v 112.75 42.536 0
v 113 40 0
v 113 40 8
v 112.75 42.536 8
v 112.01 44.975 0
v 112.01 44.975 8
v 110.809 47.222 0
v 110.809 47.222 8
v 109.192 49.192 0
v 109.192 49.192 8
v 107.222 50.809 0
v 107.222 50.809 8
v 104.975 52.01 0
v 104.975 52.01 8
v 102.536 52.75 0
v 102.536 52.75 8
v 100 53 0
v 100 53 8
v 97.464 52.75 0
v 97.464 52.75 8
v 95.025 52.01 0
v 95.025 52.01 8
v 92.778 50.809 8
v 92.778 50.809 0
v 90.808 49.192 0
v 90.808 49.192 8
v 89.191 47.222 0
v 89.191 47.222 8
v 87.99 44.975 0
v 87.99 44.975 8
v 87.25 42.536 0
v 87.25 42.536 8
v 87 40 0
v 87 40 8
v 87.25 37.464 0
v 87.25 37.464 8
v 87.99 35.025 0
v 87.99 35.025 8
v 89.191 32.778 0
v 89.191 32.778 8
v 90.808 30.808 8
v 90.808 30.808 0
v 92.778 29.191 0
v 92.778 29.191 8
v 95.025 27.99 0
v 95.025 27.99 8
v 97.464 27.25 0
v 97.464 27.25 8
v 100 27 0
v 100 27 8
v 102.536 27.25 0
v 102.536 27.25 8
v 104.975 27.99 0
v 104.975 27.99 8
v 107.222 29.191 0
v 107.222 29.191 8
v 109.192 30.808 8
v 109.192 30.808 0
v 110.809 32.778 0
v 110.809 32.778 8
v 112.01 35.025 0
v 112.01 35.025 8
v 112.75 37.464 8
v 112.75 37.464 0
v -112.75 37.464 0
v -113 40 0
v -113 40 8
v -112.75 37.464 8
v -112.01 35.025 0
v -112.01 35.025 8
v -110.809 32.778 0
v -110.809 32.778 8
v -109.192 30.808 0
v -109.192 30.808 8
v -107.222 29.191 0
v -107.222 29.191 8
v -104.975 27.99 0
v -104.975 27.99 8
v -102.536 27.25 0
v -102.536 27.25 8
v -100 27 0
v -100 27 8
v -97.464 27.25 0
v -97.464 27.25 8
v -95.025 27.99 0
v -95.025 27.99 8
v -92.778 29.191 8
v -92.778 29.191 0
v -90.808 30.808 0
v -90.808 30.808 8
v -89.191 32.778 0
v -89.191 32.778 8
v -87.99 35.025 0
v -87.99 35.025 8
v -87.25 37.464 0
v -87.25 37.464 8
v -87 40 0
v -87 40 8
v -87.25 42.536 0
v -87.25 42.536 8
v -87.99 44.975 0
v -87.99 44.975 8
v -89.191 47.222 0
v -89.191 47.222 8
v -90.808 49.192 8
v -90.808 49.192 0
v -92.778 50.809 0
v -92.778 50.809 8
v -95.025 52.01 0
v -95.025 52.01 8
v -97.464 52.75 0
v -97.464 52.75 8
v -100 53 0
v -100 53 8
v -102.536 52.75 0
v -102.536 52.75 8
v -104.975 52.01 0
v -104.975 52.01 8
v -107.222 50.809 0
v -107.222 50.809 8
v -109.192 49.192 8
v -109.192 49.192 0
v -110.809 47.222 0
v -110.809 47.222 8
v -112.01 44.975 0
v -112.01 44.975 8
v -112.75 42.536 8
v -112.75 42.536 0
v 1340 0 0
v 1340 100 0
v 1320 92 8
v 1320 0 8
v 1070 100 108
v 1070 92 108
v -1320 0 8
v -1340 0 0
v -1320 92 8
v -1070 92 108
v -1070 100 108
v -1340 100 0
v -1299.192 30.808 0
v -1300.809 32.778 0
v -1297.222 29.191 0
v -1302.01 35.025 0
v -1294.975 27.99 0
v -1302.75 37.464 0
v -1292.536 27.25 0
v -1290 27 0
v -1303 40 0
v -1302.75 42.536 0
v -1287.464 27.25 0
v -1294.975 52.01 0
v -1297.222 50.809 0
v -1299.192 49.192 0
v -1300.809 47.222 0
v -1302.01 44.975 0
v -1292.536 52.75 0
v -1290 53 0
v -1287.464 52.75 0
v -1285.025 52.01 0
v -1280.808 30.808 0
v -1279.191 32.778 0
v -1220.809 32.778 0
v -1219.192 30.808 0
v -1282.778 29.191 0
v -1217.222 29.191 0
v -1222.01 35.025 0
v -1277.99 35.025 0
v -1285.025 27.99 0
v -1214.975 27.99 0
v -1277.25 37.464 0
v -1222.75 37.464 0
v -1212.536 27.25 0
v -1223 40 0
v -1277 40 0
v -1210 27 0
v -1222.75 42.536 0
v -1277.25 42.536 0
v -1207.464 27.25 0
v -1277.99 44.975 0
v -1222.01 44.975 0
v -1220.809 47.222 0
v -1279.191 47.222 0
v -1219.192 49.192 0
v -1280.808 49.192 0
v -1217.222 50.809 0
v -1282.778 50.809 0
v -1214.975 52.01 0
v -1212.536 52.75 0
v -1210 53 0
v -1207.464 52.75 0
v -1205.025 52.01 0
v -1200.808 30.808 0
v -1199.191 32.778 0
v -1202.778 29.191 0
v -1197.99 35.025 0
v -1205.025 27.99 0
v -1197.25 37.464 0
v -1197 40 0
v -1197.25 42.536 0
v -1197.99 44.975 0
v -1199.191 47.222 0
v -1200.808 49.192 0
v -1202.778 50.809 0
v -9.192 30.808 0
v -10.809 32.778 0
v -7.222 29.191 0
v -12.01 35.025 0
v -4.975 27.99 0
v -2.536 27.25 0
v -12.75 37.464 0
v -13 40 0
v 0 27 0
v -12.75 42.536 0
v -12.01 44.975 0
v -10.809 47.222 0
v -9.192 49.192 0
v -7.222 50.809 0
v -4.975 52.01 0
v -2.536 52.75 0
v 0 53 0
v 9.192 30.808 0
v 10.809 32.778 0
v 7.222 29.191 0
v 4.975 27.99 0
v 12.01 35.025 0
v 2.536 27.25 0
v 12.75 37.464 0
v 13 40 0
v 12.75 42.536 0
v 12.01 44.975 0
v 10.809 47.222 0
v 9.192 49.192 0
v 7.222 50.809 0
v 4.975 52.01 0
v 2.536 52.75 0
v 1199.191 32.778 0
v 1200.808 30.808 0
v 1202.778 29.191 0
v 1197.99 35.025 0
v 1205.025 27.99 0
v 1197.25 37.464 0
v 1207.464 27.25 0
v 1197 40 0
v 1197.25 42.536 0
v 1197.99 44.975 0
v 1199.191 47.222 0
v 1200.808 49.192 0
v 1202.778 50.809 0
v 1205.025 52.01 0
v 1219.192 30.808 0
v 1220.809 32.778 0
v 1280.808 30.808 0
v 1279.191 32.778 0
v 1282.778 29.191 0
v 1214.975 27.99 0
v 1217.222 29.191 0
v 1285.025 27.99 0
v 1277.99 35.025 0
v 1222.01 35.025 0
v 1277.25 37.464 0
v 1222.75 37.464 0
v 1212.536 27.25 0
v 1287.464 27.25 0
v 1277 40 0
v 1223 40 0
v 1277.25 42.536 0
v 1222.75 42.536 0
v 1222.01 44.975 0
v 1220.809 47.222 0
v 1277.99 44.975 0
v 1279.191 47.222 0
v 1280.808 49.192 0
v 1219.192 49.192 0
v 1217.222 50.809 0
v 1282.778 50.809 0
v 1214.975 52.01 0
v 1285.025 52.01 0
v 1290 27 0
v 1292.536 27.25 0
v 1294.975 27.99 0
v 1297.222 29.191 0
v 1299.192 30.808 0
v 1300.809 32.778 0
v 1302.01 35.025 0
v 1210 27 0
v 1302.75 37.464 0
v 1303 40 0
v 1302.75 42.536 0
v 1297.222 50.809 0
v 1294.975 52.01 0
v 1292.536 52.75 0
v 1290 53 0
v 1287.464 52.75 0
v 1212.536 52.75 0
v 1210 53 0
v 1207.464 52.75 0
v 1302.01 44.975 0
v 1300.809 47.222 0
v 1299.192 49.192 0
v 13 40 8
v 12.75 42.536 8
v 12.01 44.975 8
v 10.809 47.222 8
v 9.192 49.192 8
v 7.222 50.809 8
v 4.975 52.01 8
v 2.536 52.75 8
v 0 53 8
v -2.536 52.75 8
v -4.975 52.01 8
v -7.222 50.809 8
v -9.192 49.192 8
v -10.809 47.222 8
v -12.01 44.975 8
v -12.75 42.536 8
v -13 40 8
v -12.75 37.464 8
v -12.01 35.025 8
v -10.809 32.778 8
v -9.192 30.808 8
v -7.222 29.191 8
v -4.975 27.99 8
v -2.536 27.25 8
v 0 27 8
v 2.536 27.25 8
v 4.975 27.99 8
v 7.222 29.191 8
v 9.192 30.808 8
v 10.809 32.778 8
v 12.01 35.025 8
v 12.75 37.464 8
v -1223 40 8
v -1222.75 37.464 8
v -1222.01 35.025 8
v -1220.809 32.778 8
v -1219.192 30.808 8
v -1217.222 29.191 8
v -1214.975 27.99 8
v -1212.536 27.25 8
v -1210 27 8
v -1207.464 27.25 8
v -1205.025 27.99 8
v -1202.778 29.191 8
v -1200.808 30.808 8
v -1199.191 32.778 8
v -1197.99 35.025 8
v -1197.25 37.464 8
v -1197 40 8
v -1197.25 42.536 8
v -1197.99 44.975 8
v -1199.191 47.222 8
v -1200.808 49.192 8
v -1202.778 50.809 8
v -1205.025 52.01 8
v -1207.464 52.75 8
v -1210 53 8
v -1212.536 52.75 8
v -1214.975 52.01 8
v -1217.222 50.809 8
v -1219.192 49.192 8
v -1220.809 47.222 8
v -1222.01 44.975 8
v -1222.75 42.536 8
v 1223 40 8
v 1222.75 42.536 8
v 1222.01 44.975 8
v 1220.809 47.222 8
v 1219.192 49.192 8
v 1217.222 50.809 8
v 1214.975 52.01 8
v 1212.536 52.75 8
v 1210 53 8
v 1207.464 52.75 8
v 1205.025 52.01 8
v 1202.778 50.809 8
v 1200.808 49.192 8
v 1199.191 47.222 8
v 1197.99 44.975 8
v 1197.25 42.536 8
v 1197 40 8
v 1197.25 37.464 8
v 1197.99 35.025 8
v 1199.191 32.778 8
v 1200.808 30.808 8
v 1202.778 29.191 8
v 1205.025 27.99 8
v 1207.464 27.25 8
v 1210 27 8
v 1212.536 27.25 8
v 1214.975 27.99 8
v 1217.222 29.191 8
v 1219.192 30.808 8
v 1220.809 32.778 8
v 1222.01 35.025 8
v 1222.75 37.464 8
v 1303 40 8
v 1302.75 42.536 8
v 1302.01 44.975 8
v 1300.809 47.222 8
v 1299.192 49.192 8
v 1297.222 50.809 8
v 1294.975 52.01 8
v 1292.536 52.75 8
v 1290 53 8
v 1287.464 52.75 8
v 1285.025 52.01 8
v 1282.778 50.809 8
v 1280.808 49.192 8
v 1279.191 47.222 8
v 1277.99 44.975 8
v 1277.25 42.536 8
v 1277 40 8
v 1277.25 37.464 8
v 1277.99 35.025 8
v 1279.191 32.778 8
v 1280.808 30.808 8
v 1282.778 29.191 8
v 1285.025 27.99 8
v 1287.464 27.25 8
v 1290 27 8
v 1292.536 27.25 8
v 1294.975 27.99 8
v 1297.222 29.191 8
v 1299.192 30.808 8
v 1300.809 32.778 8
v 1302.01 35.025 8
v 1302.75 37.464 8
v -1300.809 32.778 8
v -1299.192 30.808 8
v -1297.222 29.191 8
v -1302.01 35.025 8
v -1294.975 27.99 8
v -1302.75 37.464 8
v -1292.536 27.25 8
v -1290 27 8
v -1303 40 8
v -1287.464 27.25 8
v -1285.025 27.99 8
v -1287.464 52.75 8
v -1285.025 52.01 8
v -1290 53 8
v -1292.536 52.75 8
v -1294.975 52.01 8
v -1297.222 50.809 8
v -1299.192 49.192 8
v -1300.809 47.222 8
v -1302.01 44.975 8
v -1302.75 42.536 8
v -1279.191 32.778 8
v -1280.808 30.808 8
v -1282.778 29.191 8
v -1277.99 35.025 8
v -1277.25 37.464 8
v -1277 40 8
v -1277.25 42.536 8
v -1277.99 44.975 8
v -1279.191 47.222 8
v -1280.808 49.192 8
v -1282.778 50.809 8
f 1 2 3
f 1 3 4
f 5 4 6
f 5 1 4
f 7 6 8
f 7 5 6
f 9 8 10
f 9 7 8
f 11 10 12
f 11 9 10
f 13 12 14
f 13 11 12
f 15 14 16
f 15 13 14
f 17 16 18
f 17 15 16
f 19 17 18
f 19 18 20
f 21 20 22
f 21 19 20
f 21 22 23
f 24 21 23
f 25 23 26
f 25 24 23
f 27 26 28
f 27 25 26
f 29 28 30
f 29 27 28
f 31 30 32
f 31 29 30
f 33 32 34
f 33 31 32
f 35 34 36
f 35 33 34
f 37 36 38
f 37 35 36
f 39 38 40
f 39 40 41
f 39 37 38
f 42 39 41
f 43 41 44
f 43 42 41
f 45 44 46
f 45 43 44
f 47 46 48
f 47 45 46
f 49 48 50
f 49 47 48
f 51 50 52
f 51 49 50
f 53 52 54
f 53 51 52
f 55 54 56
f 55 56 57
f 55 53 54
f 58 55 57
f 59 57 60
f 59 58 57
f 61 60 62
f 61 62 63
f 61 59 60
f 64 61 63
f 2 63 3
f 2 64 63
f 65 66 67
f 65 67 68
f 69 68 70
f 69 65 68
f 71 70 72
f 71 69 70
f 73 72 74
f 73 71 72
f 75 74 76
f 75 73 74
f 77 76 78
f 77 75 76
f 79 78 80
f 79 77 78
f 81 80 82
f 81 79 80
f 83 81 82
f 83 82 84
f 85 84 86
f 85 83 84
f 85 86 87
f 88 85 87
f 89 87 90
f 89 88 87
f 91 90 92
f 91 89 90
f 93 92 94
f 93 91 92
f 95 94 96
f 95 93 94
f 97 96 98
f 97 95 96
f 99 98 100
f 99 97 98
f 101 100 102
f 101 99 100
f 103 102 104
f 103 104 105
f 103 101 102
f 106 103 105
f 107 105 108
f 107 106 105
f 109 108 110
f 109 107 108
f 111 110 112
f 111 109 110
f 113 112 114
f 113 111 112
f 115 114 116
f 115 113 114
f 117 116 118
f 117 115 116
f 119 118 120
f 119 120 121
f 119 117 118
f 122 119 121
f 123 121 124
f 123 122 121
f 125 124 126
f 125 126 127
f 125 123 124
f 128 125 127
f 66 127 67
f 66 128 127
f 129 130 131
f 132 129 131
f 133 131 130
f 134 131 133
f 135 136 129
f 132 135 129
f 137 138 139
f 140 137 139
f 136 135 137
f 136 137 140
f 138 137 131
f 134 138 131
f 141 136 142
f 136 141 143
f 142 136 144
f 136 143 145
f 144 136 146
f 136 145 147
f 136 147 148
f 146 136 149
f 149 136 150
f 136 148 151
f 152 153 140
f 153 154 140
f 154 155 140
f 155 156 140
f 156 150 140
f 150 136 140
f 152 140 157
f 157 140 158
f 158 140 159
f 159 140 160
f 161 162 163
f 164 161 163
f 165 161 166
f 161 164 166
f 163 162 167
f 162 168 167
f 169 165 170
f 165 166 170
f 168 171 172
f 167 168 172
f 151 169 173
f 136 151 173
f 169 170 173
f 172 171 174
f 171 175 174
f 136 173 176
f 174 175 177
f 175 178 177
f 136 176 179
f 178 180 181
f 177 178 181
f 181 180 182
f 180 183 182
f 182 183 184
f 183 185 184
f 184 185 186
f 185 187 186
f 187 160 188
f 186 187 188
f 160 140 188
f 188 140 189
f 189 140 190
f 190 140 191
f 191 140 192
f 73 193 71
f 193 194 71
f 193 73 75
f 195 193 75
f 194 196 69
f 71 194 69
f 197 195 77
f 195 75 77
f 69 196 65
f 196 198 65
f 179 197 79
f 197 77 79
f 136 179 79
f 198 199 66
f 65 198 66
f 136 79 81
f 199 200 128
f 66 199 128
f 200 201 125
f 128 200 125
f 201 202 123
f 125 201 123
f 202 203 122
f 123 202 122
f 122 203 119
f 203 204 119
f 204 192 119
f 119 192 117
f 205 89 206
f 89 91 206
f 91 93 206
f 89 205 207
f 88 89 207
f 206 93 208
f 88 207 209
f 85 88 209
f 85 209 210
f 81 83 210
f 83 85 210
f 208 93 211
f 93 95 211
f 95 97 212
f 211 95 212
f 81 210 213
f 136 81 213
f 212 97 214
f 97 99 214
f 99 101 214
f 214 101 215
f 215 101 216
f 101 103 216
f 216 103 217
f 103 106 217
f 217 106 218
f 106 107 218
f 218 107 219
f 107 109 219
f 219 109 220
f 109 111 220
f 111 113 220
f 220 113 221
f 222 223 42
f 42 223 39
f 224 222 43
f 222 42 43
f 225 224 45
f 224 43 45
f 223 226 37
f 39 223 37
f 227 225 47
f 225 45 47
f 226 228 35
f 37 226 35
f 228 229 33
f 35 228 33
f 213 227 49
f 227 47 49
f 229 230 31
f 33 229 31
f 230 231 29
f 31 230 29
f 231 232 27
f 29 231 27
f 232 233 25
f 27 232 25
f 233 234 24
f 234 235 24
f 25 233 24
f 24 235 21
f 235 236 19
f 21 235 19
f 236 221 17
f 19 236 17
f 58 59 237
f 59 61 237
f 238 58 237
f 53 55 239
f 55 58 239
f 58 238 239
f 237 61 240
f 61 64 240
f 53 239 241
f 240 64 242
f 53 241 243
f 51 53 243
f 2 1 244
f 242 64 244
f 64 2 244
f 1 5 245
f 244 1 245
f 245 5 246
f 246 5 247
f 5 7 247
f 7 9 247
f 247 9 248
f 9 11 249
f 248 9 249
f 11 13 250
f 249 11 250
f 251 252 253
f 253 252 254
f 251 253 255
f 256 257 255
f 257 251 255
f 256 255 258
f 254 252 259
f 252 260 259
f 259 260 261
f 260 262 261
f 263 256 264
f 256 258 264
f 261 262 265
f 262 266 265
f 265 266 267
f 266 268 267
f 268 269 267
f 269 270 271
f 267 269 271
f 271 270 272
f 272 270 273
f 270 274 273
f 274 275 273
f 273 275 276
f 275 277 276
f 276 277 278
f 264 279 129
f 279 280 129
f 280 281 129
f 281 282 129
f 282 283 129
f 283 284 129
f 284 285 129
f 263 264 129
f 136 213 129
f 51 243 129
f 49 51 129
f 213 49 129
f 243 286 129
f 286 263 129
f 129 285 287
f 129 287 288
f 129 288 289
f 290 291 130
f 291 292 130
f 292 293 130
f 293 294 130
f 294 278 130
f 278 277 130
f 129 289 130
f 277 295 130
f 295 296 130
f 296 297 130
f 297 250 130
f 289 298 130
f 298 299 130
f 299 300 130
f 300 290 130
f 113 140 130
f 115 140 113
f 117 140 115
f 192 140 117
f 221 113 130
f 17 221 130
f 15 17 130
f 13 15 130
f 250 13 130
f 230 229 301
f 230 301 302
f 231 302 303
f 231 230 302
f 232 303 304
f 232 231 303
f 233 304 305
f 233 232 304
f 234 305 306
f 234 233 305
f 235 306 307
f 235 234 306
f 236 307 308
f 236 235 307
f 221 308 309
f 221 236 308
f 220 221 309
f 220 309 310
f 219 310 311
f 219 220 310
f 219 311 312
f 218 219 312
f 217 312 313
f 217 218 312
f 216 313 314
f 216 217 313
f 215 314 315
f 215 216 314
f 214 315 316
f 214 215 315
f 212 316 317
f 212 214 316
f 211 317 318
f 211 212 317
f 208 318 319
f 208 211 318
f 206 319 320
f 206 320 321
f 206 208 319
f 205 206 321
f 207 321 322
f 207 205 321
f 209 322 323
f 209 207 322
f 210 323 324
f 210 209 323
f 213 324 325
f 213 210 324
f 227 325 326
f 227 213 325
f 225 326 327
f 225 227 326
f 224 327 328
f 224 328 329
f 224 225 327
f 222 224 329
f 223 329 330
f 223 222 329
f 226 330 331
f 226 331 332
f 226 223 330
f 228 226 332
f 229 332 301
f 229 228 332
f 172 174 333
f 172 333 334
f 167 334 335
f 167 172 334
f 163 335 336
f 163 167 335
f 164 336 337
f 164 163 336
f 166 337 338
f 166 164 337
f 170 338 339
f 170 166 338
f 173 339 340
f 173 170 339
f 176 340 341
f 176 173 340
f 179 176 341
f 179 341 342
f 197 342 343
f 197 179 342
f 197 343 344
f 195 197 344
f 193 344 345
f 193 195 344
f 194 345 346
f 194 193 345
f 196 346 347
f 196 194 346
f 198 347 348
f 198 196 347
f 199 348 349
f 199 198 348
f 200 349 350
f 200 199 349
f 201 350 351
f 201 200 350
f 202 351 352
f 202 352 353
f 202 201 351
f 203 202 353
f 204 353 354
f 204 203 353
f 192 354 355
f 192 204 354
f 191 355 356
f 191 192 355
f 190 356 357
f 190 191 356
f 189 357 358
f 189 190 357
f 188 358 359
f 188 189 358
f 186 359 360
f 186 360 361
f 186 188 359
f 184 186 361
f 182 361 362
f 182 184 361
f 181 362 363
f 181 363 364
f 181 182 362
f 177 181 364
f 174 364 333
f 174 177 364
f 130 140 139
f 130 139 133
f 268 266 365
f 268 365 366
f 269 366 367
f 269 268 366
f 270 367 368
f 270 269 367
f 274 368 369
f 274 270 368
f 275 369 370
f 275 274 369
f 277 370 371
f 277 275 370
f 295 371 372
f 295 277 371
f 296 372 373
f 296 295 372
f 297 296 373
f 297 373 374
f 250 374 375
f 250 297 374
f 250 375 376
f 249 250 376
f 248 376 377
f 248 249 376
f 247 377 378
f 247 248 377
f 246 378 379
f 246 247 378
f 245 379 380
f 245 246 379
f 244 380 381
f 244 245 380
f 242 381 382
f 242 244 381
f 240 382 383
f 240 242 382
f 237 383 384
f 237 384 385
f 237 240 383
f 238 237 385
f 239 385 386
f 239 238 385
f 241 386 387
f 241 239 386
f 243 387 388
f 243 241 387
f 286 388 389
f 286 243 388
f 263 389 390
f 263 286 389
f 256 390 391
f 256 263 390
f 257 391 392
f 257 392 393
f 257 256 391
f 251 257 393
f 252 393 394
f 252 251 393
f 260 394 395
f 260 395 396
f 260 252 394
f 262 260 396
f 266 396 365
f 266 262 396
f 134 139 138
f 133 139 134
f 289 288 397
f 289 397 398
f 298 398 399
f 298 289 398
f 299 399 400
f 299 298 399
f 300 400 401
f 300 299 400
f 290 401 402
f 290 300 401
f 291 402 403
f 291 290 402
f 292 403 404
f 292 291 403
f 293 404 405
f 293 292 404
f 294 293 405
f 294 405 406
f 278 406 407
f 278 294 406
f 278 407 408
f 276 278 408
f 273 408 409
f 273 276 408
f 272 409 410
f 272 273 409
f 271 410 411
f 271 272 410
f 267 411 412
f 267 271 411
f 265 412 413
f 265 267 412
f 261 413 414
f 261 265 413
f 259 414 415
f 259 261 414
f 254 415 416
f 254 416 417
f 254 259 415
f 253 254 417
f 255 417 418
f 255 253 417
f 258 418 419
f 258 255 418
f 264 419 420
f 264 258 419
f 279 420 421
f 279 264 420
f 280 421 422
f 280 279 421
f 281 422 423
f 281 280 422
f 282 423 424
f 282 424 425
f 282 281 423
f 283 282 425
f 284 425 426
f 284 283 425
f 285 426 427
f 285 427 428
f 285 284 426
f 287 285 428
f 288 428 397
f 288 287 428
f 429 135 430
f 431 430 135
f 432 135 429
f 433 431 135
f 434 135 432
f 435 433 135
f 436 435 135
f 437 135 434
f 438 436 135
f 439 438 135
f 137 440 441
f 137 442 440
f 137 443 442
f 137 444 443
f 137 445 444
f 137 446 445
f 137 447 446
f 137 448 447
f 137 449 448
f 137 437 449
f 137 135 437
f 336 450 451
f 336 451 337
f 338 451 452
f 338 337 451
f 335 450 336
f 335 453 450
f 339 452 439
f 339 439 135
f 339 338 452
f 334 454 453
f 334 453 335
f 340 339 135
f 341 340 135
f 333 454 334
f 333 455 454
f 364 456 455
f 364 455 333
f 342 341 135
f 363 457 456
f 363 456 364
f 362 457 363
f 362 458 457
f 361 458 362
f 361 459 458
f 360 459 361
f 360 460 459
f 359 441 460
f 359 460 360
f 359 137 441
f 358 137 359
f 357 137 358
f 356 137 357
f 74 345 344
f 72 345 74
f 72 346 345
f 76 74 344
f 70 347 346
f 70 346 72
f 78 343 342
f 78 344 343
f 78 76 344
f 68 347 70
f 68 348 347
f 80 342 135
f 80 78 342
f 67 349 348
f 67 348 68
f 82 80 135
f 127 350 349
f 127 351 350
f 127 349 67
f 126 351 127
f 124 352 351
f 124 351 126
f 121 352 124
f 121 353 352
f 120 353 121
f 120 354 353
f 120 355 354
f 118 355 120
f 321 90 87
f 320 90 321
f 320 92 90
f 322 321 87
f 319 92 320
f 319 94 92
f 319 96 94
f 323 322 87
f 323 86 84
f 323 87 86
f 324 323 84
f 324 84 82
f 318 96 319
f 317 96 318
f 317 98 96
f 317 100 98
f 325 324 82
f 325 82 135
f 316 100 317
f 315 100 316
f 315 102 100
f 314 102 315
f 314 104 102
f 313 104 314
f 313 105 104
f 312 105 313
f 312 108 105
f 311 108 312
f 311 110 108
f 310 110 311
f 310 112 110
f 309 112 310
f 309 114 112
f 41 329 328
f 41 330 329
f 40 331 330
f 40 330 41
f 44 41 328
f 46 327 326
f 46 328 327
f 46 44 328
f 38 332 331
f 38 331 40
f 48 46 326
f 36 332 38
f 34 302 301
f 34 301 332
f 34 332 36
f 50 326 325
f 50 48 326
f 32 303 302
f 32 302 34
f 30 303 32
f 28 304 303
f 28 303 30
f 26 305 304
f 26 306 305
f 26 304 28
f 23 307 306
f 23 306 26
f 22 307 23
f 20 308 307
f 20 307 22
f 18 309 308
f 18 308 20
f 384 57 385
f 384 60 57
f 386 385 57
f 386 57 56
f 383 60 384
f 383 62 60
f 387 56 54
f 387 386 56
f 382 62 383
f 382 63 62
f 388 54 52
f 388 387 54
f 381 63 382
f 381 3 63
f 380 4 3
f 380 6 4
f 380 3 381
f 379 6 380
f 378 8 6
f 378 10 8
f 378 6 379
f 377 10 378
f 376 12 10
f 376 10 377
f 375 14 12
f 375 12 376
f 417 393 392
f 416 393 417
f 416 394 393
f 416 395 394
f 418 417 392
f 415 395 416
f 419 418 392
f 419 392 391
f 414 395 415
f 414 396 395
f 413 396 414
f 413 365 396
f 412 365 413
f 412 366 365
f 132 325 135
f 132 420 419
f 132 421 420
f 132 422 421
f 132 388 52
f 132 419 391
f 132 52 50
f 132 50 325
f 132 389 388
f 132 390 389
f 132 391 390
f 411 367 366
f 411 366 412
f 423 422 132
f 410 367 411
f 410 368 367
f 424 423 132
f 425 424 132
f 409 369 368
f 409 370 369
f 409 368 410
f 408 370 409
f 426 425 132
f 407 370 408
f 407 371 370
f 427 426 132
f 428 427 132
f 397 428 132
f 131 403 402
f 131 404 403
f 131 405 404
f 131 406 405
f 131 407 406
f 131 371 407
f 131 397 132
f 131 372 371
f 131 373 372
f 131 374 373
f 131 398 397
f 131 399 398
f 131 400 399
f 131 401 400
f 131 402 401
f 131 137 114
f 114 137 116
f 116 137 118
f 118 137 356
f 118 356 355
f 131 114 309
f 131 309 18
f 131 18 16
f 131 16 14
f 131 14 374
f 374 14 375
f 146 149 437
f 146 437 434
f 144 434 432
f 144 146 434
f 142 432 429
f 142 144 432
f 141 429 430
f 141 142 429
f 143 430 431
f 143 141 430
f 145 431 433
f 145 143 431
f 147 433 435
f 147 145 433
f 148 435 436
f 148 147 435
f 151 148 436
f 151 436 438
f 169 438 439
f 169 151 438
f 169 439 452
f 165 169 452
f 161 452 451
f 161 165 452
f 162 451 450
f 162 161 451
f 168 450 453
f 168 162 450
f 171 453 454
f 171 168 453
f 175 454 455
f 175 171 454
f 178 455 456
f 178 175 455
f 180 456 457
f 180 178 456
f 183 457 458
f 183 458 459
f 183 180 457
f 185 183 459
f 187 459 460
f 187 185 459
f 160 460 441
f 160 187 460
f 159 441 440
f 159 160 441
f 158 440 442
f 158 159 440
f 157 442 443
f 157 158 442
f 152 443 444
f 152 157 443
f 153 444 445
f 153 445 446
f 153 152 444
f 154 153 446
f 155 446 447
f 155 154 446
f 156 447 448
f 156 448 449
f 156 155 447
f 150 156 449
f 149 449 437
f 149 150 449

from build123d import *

# Parameters (mm, degrees)
SKETCH_1_W          = 2680
SKETCH_1_H          = 100
SKETCH_1_R          = 13
EXTRUDE_498_DEPTH   = 8
SKETCH_2_W          = 2680
SKETCH_2_H          = 8
EXTRUDE_1_DEPTH     = 100
CUT_EXTRUDE_1_DEPTH = 100


# Read off the part's stored shape, not the designer's step: 切除-拉伸1
with BuildPart() as part:
    # 草图1 → Extrude 498 (new body)
    with BuildSketch(Plane.XY):
        with Locations((0, 50)):
            Rectangle(SKETCH_1_W, SKETCH_1_H)
        with Locations((1290, 40)):
            Circle(SKETCH_1_R, mode=Mode.SUBTRACT)
        with Locations((1210, 40)):
            Circle(SKETCH_1_R, mode=Mode.SUBTRACT)
        with Locations((0, 40)):
            Circle(SKETCH_1_R, mode=Mode.SUBTRACT)
        with Locations((100, 40)):
            Circle(SKETCH_1_R, mode=Mode.SUBTRACT)
        with Locations(Location((-100, 40, 0), (0, 0, 180))):
            Circle(SKETCH_1_R, mode=Mode.SUBTRACT)
        with Locations(Location((-1290, 40, 0), (0, 0, 180))):
            Circle(SKETCH_1_R, mode=Mode.SUBTRACT)
        with Locations(Location((-1210, 40, 0), (0, 0, 180))):
            Circle(SKETCH_1_R, mode=Mode.SUBTRACT)
    extrude(amount=EXTRUDE_498_DEPTH)

    # 草图2 → 凸台-拉伸1 (add)
    with BuildSketch(Plane.XY.offset(8)):
        with Locations((0, 96)):
            Rectangle(SKETCH_2_W, SKETCH_2_H)
    extrude(amount=EXTRUDE_1_DEPTH)

    # 切除-拉伸1 outline → 切除-拉伸1 (cut)
    with BuildSketch(Plane(origin=(0, 0, 0), x_dir=(1, 0, 0), z_dir=(0, 1, 0))):
        Polygon((1340, -108), (1340, 0), (1070, -108), align=None)
        Polygon((-1340, -108), (-1070, -108), (-1340, 0), align=None)
    extrude(amount=CUT_EXTRUDE_1_DEPTH, mode=Mode.SUBTRACT)


solid = part.part
